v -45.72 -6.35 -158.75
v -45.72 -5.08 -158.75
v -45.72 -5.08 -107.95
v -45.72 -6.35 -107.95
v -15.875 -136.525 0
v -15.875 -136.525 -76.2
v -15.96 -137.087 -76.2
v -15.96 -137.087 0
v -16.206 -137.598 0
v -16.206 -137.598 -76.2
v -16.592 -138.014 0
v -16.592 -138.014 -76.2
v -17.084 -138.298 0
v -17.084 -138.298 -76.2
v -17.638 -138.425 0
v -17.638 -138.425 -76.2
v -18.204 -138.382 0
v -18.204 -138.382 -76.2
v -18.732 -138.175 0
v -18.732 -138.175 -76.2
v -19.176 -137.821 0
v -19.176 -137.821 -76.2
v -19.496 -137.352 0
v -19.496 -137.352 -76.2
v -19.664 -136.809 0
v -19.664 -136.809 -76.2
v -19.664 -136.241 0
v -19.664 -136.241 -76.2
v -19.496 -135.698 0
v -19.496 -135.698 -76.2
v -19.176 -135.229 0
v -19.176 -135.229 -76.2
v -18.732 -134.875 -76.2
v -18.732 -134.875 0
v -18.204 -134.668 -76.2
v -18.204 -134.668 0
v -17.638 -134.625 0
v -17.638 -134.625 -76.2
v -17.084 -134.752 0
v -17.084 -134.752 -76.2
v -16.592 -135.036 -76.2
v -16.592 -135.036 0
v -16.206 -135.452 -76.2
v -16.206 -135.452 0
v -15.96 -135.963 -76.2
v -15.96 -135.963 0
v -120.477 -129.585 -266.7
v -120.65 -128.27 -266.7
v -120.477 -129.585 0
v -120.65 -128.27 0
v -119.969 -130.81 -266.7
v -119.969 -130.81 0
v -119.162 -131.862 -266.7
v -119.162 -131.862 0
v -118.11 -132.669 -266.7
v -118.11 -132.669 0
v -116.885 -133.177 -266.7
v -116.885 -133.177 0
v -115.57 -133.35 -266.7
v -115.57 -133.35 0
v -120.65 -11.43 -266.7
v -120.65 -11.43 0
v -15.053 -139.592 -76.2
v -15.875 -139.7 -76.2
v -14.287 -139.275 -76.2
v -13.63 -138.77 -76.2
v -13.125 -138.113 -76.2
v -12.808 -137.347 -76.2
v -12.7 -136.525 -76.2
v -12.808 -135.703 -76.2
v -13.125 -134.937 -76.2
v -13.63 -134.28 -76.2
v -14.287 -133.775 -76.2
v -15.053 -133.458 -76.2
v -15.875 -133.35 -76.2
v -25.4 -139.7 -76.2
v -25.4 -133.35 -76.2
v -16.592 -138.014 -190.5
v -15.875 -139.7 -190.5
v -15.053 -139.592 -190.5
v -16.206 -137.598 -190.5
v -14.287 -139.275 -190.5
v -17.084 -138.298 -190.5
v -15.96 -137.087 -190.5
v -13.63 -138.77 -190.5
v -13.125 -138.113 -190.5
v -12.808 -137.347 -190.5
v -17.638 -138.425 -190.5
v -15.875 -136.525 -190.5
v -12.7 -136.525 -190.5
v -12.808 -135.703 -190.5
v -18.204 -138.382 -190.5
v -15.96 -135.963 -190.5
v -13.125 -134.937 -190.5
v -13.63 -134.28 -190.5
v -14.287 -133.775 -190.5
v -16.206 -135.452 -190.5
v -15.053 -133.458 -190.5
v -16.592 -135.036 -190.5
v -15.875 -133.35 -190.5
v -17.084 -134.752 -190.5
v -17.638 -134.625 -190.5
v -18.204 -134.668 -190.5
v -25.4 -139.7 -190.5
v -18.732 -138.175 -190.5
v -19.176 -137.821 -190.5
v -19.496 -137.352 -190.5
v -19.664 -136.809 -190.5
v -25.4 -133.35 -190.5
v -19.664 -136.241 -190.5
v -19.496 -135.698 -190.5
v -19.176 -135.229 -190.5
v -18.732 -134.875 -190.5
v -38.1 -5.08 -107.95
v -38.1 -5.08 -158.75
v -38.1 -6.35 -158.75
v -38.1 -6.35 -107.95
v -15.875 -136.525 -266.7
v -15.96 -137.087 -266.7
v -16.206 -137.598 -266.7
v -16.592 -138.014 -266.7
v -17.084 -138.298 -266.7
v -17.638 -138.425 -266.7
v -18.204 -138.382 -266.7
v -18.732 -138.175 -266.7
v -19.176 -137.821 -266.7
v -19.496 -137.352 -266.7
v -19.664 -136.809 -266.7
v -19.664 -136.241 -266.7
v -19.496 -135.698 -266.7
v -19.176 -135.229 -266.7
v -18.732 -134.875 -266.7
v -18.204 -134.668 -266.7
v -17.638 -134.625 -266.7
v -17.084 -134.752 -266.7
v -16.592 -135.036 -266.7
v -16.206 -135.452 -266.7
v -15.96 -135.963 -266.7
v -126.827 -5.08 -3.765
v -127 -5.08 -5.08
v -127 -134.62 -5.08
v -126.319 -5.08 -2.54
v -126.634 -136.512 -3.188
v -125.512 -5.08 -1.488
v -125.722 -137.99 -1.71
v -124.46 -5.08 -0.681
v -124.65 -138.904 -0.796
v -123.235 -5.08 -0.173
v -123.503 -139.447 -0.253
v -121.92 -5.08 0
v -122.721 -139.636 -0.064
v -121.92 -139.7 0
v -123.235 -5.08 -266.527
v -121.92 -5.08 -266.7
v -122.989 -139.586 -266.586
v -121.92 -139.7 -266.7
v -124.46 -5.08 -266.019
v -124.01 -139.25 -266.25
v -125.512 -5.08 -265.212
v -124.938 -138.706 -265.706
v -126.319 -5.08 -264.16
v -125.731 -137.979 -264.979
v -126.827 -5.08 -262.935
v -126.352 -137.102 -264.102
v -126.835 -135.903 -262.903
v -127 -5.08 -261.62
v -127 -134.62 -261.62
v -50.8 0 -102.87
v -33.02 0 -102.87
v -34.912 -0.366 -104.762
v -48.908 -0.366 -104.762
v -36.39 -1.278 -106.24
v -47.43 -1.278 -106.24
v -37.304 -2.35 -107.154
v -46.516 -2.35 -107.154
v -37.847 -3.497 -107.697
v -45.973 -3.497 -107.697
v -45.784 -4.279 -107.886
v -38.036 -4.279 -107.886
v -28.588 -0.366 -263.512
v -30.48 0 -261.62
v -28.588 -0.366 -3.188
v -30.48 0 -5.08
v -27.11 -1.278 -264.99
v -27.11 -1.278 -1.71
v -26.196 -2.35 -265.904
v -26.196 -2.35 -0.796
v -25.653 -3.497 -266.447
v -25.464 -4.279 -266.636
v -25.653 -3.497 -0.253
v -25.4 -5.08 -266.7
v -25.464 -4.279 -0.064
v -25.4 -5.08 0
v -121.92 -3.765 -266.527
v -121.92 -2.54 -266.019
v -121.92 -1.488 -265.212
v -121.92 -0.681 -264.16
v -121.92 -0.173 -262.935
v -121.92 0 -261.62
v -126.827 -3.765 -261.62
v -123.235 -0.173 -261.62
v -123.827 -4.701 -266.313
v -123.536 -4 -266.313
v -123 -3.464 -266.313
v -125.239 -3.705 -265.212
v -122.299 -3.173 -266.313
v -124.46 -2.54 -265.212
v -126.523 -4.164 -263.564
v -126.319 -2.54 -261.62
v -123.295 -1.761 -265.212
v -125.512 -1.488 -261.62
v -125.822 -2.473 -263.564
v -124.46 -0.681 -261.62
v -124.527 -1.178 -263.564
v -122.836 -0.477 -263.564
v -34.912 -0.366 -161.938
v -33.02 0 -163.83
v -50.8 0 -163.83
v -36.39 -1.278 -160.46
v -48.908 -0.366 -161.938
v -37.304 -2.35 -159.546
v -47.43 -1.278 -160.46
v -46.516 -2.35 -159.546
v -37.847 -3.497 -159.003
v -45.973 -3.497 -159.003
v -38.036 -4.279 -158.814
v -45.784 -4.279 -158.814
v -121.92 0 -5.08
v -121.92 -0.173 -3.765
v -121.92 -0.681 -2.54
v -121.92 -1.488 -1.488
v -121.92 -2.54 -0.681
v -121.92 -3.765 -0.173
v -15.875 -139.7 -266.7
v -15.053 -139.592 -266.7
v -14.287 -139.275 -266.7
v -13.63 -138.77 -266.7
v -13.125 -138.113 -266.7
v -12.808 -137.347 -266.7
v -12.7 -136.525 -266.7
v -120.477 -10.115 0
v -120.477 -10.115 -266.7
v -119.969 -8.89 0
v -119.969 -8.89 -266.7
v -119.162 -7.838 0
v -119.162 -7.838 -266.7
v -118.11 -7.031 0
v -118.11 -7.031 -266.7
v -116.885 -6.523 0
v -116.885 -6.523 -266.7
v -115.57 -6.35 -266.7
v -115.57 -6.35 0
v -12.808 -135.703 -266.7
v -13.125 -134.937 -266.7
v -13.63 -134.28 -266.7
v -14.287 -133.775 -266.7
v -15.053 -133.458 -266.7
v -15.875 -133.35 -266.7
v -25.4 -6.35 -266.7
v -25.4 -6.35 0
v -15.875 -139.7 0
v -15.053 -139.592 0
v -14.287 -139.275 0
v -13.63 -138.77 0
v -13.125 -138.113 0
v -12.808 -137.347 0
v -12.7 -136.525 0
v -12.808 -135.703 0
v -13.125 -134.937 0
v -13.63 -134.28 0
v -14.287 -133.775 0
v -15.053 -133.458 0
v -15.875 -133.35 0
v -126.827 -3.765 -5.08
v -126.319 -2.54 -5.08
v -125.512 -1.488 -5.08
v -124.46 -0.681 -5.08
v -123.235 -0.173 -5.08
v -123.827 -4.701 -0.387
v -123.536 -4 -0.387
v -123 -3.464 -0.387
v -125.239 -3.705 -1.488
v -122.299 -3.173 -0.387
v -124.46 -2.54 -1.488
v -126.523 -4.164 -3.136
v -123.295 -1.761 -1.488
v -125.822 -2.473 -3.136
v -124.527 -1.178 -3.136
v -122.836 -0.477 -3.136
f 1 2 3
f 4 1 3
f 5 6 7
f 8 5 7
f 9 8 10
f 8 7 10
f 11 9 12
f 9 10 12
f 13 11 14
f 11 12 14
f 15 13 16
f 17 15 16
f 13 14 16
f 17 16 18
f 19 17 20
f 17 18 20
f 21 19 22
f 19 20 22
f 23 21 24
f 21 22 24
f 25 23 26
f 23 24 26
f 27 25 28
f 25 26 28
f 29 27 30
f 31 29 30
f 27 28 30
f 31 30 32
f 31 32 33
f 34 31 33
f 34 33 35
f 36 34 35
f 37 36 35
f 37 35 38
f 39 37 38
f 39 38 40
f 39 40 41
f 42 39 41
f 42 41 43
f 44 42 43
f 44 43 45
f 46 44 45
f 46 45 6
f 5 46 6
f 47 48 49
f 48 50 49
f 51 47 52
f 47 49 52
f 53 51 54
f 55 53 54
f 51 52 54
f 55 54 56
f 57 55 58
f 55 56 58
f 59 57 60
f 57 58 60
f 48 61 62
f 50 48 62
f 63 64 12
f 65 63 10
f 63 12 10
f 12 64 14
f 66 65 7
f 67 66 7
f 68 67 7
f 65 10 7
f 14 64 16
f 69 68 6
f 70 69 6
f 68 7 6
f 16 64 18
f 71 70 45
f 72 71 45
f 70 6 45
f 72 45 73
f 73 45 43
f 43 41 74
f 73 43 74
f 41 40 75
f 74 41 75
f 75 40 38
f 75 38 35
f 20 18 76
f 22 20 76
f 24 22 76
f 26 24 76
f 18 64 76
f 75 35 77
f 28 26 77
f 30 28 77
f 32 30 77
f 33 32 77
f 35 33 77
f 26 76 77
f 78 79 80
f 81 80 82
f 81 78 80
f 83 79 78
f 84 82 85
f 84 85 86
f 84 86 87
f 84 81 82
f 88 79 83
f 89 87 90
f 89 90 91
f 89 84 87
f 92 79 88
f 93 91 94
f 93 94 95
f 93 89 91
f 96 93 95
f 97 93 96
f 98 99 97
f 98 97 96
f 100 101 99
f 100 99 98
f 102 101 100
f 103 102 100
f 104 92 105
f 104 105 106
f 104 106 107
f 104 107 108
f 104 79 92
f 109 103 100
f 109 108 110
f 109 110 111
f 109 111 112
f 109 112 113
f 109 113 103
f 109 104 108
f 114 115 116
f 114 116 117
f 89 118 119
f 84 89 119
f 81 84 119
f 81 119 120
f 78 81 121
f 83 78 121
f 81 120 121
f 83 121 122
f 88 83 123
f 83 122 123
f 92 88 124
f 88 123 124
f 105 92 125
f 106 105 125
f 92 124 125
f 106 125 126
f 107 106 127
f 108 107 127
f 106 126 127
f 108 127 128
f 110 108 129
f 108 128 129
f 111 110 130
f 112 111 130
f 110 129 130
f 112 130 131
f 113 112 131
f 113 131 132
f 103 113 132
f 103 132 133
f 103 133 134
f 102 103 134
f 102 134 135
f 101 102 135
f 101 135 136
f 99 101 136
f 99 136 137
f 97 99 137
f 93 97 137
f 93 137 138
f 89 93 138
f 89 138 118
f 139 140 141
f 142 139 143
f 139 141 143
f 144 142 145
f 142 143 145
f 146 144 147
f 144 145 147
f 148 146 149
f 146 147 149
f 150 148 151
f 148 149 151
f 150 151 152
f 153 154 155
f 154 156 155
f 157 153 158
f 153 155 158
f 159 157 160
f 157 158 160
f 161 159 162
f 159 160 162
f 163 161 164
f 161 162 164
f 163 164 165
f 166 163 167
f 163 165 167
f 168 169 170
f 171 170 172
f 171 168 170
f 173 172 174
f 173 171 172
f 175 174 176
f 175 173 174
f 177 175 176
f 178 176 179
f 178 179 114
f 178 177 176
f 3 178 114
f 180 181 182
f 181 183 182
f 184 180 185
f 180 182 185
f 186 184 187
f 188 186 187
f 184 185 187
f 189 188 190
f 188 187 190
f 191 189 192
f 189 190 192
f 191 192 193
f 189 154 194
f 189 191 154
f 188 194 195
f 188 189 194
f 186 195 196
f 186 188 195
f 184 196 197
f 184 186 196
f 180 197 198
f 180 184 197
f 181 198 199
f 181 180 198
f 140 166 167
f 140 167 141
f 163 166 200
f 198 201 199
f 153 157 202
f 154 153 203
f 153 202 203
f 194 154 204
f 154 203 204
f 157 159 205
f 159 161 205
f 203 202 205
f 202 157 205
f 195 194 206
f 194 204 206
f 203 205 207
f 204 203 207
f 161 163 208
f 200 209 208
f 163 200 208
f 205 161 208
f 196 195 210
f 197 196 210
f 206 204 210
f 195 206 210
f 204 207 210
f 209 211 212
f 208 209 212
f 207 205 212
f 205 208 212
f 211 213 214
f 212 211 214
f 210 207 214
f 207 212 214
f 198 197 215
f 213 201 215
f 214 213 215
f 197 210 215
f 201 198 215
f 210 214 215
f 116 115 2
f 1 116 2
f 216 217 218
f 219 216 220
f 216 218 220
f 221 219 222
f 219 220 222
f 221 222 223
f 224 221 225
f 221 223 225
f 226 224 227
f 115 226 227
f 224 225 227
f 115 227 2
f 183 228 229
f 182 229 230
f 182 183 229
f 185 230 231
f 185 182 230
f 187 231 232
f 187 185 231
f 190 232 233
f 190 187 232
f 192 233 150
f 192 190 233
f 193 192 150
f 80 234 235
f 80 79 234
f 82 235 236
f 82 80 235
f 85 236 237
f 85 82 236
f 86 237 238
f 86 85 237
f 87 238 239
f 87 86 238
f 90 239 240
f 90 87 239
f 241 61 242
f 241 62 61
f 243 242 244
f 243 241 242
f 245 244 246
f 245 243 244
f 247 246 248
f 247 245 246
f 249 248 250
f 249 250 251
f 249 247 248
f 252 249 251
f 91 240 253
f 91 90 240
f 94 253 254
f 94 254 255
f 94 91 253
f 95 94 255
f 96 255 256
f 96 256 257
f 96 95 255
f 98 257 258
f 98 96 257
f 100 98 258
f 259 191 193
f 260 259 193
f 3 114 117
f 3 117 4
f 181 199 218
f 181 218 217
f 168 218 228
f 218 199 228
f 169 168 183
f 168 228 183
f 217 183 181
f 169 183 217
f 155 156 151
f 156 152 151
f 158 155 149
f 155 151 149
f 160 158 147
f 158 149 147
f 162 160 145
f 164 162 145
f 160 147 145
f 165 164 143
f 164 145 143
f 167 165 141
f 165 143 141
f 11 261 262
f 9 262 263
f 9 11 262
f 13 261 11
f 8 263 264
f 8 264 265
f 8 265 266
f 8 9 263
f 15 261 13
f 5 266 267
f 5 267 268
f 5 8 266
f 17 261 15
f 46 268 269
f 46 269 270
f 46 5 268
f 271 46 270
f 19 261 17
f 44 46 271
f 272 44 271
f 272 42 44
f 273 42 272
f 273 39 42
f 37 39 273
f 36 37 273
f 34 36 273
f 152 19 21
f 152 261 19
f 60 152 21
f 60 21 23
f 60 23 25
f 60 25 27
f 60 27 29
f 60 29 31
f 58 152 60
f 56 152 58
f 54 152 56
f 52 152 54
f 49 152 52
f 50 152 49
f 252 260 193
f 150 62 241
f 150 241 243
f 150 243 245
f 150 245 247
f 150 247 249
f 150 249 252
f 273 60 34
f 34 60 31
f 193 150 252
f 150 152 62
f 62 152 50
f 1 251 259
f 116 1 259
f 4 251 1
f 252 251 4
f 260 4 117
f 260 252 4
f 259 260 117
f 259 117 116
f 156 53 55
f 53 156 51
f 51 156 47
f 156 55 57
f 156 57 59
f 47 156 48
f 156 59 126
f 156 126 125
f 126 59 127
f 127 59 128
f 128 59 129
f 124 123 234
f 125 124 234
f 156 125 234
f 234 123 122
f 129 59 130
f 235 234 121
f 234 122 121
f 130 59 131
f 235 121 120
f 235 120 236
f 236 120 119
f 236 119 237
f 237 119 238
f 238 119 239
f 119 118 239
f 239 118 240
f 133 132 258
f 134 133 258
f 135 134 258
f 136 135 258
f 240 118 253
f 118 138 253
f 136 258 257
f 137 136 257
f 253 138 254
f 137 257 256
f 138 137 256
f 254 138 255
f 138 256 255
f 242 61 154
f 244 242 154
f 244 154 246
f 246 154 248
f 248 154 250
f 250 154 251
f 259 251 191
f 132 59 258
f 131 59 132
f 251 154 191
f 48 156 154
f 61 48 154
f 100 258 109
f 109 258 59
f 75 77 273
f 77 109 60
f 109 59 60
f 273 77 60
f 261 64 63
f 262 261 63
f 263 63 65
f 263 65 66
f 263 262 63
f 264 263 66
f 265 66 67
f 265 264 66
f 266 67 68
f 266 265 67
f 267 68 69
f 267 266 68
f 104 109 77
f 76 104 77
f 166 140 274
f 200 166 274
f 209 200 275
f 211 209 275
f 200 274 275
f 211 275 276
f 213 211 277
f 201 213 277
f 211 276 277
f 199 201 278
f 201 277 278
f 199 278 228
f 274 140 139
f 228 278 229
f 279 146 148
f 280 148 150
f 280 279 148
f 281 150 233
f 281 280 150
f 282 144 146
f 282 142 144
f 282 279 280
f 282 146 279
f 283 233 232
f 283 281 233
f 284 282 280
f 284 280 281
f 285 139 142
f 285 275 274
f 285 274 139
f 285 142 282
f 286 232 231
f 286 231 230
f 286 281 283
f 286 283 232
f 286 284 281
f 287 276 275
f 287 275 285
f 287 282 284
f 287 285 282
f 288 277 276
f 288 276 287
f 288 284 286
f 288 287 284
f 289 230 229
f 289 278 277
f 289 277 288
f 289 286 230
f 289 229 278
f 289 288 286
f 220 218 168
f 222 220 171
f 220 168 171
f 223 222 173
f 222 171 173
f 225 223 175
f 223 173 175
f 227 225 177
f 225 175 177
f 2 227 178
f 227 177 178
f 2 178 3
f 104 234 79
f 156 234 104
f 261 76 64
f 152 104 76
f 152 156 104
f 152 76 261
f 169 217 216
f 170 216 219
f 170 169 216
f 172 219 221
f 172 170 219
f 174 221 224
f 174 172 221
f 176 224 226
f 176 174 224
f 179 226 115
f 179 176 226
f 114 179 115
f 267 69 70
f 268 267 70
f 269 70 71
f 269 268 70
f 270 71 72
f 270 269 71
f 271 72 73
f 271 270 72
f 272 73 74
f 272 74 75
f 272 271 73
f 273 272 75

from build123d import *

# Parameters (mm, degrees)
F0_W      = 127
F0_H      = 266.7
F1_DEPTH  = 139.7
F2_T      = -6.35
F3_R      = 5.08
F4_DEPTH  = 25.4
F5_W      = 7.62
F5_H      = 50.8
F6_DEPTH  = 25.4
F7_R      = 1.905
F8_DEPTH  = 266.701
F9_R      = 5.08
F11_W     = 6.35
F11_H     = 76.2
F12_DEPTH = 12.7
F13_DEPTH = 266.701
F14_R     = 3.17499


# Not quite as in the source:
# - a fillet or chamfer is up to 0.001 mm smaller than in the source, because OpenCascade refuses the exact size


with BuildPart() as f1:
    # F0 (on Front) → F1 (new body)
    with BuildSketch(Plane.XZ):
        with Locations((-63.5, -133.35)):
            Rectangle(F0_W, F0_H)
    extrude(amount=F1_DEPTH)

    # F2
    f2_openings = [f1.faces().sort_by_distance(p)[0] for p in [
        (-63.5, -69.85, -266.7),
        (-63.5, -69.85, 0),
    ]]
    offset(amount=F2_T, openings=f2_openings)

    # F3
    f3_edges = [f1.edges().sort_by_distance(p)[0] for p in [
        (-6.35, -133.35, -133.35),
        (-120.65, -133.35, -133.35),
        (-6.35, -6.35, -133.35),
        (-120.65, -6.35, -133.35),
    ]]
    fillet(f3_edges, radius=F3_R)

    # F4 (cut): a face of the model
    f4_faces = [f1.faces().sort_by_distance(p)[0] for p in [
        (0, -69.85, -133.35),
    ]]
    extrude(f4_faces, amount=-F4_DEPTH, mode=Mode.SUBTRACT)

    # F5 (on face) → F6 (cut)
    with BuildSketch(Plane(origin=(0, 0, 0), x_dir=(-1, 0, 0), z_dir=(0, 1, 0))):
        with Locations((41.91, -133.35)):
            Rectangle(F5_W, F5_H)
    extrude(amount=-F6_DEPTH, mode=Mode.SUBTRACT)

    # F7 (on face) → F8 (cut, through all)
    with BuildSketch(Plane(origin=(0, 0, -266.7), x_dir=(1, 0, 0), z_dir=(0, 0, -1))):
        with Locations((-17.78, 136.525)):
            Circle(F7_R)
    extrude(amount=-F8_DEPTH, mode=Mode.SUBTRACT)

    # F9
    f9_edges = [f1.edges().sort_by_distance(p)[0] for p in [
        (-127, 0, -133.35),
        (-127, -69.85, -266.7),
        (-127, -69.85, 0),
        (-127, -139.7, -133.35),
        (-25.4, 0, -133.35),
        (-76.2, 0, -266.7),
        (-76.2, 0, 0),
        (-45.72, 0, -133.35),
        (-41.91, 0, -158.75),
        (-38.1, 0, -133.35),
        (-41.91, 0, -107.95),
    ]]
    fillet(f9_edges, radius=F9_R)

    # F11 (on offset) → F12 (join)
    with BuildSketch(Plane.YZ.offset(-25.4)):
        with Locations((-136.525, -38.1)):
            Rectangle(F11_W, F11_H)
        with Locations((-136.525, -228.6)):
            Rectangle(F11_W, F11_H)
    extrude(amount=F12_DEPTH)

    # F7 (on face) → F13 (cut, through all)
    with BuildSketch(Plane(origin=(0, 0, -266.7), x_dir=(1, 0, 0), z_dir=(0, 0, -1))):
        with Locations((-17.78, 136.525)):
            Circle(F7_R)
    extrude(amount=-F13_DEPTH, mode=Mode.SUBTRACT)

    # F14 (radius 3.175 in the source; OpenCascade refuses exactly that, so slightly less here)
    f14_edges = [f1.edges().sort_by_distance(p)[0] for p in [
        (-12.7, -133.35, -228.6),
        (-12.7, -133.35, -38.1),
        (-12.7, -139.7, -38.1),
        (-12.7, -139.7, -228.6),
    ]]
    fillet(f14_edges, radius=F14_R)


solid = f1.part
